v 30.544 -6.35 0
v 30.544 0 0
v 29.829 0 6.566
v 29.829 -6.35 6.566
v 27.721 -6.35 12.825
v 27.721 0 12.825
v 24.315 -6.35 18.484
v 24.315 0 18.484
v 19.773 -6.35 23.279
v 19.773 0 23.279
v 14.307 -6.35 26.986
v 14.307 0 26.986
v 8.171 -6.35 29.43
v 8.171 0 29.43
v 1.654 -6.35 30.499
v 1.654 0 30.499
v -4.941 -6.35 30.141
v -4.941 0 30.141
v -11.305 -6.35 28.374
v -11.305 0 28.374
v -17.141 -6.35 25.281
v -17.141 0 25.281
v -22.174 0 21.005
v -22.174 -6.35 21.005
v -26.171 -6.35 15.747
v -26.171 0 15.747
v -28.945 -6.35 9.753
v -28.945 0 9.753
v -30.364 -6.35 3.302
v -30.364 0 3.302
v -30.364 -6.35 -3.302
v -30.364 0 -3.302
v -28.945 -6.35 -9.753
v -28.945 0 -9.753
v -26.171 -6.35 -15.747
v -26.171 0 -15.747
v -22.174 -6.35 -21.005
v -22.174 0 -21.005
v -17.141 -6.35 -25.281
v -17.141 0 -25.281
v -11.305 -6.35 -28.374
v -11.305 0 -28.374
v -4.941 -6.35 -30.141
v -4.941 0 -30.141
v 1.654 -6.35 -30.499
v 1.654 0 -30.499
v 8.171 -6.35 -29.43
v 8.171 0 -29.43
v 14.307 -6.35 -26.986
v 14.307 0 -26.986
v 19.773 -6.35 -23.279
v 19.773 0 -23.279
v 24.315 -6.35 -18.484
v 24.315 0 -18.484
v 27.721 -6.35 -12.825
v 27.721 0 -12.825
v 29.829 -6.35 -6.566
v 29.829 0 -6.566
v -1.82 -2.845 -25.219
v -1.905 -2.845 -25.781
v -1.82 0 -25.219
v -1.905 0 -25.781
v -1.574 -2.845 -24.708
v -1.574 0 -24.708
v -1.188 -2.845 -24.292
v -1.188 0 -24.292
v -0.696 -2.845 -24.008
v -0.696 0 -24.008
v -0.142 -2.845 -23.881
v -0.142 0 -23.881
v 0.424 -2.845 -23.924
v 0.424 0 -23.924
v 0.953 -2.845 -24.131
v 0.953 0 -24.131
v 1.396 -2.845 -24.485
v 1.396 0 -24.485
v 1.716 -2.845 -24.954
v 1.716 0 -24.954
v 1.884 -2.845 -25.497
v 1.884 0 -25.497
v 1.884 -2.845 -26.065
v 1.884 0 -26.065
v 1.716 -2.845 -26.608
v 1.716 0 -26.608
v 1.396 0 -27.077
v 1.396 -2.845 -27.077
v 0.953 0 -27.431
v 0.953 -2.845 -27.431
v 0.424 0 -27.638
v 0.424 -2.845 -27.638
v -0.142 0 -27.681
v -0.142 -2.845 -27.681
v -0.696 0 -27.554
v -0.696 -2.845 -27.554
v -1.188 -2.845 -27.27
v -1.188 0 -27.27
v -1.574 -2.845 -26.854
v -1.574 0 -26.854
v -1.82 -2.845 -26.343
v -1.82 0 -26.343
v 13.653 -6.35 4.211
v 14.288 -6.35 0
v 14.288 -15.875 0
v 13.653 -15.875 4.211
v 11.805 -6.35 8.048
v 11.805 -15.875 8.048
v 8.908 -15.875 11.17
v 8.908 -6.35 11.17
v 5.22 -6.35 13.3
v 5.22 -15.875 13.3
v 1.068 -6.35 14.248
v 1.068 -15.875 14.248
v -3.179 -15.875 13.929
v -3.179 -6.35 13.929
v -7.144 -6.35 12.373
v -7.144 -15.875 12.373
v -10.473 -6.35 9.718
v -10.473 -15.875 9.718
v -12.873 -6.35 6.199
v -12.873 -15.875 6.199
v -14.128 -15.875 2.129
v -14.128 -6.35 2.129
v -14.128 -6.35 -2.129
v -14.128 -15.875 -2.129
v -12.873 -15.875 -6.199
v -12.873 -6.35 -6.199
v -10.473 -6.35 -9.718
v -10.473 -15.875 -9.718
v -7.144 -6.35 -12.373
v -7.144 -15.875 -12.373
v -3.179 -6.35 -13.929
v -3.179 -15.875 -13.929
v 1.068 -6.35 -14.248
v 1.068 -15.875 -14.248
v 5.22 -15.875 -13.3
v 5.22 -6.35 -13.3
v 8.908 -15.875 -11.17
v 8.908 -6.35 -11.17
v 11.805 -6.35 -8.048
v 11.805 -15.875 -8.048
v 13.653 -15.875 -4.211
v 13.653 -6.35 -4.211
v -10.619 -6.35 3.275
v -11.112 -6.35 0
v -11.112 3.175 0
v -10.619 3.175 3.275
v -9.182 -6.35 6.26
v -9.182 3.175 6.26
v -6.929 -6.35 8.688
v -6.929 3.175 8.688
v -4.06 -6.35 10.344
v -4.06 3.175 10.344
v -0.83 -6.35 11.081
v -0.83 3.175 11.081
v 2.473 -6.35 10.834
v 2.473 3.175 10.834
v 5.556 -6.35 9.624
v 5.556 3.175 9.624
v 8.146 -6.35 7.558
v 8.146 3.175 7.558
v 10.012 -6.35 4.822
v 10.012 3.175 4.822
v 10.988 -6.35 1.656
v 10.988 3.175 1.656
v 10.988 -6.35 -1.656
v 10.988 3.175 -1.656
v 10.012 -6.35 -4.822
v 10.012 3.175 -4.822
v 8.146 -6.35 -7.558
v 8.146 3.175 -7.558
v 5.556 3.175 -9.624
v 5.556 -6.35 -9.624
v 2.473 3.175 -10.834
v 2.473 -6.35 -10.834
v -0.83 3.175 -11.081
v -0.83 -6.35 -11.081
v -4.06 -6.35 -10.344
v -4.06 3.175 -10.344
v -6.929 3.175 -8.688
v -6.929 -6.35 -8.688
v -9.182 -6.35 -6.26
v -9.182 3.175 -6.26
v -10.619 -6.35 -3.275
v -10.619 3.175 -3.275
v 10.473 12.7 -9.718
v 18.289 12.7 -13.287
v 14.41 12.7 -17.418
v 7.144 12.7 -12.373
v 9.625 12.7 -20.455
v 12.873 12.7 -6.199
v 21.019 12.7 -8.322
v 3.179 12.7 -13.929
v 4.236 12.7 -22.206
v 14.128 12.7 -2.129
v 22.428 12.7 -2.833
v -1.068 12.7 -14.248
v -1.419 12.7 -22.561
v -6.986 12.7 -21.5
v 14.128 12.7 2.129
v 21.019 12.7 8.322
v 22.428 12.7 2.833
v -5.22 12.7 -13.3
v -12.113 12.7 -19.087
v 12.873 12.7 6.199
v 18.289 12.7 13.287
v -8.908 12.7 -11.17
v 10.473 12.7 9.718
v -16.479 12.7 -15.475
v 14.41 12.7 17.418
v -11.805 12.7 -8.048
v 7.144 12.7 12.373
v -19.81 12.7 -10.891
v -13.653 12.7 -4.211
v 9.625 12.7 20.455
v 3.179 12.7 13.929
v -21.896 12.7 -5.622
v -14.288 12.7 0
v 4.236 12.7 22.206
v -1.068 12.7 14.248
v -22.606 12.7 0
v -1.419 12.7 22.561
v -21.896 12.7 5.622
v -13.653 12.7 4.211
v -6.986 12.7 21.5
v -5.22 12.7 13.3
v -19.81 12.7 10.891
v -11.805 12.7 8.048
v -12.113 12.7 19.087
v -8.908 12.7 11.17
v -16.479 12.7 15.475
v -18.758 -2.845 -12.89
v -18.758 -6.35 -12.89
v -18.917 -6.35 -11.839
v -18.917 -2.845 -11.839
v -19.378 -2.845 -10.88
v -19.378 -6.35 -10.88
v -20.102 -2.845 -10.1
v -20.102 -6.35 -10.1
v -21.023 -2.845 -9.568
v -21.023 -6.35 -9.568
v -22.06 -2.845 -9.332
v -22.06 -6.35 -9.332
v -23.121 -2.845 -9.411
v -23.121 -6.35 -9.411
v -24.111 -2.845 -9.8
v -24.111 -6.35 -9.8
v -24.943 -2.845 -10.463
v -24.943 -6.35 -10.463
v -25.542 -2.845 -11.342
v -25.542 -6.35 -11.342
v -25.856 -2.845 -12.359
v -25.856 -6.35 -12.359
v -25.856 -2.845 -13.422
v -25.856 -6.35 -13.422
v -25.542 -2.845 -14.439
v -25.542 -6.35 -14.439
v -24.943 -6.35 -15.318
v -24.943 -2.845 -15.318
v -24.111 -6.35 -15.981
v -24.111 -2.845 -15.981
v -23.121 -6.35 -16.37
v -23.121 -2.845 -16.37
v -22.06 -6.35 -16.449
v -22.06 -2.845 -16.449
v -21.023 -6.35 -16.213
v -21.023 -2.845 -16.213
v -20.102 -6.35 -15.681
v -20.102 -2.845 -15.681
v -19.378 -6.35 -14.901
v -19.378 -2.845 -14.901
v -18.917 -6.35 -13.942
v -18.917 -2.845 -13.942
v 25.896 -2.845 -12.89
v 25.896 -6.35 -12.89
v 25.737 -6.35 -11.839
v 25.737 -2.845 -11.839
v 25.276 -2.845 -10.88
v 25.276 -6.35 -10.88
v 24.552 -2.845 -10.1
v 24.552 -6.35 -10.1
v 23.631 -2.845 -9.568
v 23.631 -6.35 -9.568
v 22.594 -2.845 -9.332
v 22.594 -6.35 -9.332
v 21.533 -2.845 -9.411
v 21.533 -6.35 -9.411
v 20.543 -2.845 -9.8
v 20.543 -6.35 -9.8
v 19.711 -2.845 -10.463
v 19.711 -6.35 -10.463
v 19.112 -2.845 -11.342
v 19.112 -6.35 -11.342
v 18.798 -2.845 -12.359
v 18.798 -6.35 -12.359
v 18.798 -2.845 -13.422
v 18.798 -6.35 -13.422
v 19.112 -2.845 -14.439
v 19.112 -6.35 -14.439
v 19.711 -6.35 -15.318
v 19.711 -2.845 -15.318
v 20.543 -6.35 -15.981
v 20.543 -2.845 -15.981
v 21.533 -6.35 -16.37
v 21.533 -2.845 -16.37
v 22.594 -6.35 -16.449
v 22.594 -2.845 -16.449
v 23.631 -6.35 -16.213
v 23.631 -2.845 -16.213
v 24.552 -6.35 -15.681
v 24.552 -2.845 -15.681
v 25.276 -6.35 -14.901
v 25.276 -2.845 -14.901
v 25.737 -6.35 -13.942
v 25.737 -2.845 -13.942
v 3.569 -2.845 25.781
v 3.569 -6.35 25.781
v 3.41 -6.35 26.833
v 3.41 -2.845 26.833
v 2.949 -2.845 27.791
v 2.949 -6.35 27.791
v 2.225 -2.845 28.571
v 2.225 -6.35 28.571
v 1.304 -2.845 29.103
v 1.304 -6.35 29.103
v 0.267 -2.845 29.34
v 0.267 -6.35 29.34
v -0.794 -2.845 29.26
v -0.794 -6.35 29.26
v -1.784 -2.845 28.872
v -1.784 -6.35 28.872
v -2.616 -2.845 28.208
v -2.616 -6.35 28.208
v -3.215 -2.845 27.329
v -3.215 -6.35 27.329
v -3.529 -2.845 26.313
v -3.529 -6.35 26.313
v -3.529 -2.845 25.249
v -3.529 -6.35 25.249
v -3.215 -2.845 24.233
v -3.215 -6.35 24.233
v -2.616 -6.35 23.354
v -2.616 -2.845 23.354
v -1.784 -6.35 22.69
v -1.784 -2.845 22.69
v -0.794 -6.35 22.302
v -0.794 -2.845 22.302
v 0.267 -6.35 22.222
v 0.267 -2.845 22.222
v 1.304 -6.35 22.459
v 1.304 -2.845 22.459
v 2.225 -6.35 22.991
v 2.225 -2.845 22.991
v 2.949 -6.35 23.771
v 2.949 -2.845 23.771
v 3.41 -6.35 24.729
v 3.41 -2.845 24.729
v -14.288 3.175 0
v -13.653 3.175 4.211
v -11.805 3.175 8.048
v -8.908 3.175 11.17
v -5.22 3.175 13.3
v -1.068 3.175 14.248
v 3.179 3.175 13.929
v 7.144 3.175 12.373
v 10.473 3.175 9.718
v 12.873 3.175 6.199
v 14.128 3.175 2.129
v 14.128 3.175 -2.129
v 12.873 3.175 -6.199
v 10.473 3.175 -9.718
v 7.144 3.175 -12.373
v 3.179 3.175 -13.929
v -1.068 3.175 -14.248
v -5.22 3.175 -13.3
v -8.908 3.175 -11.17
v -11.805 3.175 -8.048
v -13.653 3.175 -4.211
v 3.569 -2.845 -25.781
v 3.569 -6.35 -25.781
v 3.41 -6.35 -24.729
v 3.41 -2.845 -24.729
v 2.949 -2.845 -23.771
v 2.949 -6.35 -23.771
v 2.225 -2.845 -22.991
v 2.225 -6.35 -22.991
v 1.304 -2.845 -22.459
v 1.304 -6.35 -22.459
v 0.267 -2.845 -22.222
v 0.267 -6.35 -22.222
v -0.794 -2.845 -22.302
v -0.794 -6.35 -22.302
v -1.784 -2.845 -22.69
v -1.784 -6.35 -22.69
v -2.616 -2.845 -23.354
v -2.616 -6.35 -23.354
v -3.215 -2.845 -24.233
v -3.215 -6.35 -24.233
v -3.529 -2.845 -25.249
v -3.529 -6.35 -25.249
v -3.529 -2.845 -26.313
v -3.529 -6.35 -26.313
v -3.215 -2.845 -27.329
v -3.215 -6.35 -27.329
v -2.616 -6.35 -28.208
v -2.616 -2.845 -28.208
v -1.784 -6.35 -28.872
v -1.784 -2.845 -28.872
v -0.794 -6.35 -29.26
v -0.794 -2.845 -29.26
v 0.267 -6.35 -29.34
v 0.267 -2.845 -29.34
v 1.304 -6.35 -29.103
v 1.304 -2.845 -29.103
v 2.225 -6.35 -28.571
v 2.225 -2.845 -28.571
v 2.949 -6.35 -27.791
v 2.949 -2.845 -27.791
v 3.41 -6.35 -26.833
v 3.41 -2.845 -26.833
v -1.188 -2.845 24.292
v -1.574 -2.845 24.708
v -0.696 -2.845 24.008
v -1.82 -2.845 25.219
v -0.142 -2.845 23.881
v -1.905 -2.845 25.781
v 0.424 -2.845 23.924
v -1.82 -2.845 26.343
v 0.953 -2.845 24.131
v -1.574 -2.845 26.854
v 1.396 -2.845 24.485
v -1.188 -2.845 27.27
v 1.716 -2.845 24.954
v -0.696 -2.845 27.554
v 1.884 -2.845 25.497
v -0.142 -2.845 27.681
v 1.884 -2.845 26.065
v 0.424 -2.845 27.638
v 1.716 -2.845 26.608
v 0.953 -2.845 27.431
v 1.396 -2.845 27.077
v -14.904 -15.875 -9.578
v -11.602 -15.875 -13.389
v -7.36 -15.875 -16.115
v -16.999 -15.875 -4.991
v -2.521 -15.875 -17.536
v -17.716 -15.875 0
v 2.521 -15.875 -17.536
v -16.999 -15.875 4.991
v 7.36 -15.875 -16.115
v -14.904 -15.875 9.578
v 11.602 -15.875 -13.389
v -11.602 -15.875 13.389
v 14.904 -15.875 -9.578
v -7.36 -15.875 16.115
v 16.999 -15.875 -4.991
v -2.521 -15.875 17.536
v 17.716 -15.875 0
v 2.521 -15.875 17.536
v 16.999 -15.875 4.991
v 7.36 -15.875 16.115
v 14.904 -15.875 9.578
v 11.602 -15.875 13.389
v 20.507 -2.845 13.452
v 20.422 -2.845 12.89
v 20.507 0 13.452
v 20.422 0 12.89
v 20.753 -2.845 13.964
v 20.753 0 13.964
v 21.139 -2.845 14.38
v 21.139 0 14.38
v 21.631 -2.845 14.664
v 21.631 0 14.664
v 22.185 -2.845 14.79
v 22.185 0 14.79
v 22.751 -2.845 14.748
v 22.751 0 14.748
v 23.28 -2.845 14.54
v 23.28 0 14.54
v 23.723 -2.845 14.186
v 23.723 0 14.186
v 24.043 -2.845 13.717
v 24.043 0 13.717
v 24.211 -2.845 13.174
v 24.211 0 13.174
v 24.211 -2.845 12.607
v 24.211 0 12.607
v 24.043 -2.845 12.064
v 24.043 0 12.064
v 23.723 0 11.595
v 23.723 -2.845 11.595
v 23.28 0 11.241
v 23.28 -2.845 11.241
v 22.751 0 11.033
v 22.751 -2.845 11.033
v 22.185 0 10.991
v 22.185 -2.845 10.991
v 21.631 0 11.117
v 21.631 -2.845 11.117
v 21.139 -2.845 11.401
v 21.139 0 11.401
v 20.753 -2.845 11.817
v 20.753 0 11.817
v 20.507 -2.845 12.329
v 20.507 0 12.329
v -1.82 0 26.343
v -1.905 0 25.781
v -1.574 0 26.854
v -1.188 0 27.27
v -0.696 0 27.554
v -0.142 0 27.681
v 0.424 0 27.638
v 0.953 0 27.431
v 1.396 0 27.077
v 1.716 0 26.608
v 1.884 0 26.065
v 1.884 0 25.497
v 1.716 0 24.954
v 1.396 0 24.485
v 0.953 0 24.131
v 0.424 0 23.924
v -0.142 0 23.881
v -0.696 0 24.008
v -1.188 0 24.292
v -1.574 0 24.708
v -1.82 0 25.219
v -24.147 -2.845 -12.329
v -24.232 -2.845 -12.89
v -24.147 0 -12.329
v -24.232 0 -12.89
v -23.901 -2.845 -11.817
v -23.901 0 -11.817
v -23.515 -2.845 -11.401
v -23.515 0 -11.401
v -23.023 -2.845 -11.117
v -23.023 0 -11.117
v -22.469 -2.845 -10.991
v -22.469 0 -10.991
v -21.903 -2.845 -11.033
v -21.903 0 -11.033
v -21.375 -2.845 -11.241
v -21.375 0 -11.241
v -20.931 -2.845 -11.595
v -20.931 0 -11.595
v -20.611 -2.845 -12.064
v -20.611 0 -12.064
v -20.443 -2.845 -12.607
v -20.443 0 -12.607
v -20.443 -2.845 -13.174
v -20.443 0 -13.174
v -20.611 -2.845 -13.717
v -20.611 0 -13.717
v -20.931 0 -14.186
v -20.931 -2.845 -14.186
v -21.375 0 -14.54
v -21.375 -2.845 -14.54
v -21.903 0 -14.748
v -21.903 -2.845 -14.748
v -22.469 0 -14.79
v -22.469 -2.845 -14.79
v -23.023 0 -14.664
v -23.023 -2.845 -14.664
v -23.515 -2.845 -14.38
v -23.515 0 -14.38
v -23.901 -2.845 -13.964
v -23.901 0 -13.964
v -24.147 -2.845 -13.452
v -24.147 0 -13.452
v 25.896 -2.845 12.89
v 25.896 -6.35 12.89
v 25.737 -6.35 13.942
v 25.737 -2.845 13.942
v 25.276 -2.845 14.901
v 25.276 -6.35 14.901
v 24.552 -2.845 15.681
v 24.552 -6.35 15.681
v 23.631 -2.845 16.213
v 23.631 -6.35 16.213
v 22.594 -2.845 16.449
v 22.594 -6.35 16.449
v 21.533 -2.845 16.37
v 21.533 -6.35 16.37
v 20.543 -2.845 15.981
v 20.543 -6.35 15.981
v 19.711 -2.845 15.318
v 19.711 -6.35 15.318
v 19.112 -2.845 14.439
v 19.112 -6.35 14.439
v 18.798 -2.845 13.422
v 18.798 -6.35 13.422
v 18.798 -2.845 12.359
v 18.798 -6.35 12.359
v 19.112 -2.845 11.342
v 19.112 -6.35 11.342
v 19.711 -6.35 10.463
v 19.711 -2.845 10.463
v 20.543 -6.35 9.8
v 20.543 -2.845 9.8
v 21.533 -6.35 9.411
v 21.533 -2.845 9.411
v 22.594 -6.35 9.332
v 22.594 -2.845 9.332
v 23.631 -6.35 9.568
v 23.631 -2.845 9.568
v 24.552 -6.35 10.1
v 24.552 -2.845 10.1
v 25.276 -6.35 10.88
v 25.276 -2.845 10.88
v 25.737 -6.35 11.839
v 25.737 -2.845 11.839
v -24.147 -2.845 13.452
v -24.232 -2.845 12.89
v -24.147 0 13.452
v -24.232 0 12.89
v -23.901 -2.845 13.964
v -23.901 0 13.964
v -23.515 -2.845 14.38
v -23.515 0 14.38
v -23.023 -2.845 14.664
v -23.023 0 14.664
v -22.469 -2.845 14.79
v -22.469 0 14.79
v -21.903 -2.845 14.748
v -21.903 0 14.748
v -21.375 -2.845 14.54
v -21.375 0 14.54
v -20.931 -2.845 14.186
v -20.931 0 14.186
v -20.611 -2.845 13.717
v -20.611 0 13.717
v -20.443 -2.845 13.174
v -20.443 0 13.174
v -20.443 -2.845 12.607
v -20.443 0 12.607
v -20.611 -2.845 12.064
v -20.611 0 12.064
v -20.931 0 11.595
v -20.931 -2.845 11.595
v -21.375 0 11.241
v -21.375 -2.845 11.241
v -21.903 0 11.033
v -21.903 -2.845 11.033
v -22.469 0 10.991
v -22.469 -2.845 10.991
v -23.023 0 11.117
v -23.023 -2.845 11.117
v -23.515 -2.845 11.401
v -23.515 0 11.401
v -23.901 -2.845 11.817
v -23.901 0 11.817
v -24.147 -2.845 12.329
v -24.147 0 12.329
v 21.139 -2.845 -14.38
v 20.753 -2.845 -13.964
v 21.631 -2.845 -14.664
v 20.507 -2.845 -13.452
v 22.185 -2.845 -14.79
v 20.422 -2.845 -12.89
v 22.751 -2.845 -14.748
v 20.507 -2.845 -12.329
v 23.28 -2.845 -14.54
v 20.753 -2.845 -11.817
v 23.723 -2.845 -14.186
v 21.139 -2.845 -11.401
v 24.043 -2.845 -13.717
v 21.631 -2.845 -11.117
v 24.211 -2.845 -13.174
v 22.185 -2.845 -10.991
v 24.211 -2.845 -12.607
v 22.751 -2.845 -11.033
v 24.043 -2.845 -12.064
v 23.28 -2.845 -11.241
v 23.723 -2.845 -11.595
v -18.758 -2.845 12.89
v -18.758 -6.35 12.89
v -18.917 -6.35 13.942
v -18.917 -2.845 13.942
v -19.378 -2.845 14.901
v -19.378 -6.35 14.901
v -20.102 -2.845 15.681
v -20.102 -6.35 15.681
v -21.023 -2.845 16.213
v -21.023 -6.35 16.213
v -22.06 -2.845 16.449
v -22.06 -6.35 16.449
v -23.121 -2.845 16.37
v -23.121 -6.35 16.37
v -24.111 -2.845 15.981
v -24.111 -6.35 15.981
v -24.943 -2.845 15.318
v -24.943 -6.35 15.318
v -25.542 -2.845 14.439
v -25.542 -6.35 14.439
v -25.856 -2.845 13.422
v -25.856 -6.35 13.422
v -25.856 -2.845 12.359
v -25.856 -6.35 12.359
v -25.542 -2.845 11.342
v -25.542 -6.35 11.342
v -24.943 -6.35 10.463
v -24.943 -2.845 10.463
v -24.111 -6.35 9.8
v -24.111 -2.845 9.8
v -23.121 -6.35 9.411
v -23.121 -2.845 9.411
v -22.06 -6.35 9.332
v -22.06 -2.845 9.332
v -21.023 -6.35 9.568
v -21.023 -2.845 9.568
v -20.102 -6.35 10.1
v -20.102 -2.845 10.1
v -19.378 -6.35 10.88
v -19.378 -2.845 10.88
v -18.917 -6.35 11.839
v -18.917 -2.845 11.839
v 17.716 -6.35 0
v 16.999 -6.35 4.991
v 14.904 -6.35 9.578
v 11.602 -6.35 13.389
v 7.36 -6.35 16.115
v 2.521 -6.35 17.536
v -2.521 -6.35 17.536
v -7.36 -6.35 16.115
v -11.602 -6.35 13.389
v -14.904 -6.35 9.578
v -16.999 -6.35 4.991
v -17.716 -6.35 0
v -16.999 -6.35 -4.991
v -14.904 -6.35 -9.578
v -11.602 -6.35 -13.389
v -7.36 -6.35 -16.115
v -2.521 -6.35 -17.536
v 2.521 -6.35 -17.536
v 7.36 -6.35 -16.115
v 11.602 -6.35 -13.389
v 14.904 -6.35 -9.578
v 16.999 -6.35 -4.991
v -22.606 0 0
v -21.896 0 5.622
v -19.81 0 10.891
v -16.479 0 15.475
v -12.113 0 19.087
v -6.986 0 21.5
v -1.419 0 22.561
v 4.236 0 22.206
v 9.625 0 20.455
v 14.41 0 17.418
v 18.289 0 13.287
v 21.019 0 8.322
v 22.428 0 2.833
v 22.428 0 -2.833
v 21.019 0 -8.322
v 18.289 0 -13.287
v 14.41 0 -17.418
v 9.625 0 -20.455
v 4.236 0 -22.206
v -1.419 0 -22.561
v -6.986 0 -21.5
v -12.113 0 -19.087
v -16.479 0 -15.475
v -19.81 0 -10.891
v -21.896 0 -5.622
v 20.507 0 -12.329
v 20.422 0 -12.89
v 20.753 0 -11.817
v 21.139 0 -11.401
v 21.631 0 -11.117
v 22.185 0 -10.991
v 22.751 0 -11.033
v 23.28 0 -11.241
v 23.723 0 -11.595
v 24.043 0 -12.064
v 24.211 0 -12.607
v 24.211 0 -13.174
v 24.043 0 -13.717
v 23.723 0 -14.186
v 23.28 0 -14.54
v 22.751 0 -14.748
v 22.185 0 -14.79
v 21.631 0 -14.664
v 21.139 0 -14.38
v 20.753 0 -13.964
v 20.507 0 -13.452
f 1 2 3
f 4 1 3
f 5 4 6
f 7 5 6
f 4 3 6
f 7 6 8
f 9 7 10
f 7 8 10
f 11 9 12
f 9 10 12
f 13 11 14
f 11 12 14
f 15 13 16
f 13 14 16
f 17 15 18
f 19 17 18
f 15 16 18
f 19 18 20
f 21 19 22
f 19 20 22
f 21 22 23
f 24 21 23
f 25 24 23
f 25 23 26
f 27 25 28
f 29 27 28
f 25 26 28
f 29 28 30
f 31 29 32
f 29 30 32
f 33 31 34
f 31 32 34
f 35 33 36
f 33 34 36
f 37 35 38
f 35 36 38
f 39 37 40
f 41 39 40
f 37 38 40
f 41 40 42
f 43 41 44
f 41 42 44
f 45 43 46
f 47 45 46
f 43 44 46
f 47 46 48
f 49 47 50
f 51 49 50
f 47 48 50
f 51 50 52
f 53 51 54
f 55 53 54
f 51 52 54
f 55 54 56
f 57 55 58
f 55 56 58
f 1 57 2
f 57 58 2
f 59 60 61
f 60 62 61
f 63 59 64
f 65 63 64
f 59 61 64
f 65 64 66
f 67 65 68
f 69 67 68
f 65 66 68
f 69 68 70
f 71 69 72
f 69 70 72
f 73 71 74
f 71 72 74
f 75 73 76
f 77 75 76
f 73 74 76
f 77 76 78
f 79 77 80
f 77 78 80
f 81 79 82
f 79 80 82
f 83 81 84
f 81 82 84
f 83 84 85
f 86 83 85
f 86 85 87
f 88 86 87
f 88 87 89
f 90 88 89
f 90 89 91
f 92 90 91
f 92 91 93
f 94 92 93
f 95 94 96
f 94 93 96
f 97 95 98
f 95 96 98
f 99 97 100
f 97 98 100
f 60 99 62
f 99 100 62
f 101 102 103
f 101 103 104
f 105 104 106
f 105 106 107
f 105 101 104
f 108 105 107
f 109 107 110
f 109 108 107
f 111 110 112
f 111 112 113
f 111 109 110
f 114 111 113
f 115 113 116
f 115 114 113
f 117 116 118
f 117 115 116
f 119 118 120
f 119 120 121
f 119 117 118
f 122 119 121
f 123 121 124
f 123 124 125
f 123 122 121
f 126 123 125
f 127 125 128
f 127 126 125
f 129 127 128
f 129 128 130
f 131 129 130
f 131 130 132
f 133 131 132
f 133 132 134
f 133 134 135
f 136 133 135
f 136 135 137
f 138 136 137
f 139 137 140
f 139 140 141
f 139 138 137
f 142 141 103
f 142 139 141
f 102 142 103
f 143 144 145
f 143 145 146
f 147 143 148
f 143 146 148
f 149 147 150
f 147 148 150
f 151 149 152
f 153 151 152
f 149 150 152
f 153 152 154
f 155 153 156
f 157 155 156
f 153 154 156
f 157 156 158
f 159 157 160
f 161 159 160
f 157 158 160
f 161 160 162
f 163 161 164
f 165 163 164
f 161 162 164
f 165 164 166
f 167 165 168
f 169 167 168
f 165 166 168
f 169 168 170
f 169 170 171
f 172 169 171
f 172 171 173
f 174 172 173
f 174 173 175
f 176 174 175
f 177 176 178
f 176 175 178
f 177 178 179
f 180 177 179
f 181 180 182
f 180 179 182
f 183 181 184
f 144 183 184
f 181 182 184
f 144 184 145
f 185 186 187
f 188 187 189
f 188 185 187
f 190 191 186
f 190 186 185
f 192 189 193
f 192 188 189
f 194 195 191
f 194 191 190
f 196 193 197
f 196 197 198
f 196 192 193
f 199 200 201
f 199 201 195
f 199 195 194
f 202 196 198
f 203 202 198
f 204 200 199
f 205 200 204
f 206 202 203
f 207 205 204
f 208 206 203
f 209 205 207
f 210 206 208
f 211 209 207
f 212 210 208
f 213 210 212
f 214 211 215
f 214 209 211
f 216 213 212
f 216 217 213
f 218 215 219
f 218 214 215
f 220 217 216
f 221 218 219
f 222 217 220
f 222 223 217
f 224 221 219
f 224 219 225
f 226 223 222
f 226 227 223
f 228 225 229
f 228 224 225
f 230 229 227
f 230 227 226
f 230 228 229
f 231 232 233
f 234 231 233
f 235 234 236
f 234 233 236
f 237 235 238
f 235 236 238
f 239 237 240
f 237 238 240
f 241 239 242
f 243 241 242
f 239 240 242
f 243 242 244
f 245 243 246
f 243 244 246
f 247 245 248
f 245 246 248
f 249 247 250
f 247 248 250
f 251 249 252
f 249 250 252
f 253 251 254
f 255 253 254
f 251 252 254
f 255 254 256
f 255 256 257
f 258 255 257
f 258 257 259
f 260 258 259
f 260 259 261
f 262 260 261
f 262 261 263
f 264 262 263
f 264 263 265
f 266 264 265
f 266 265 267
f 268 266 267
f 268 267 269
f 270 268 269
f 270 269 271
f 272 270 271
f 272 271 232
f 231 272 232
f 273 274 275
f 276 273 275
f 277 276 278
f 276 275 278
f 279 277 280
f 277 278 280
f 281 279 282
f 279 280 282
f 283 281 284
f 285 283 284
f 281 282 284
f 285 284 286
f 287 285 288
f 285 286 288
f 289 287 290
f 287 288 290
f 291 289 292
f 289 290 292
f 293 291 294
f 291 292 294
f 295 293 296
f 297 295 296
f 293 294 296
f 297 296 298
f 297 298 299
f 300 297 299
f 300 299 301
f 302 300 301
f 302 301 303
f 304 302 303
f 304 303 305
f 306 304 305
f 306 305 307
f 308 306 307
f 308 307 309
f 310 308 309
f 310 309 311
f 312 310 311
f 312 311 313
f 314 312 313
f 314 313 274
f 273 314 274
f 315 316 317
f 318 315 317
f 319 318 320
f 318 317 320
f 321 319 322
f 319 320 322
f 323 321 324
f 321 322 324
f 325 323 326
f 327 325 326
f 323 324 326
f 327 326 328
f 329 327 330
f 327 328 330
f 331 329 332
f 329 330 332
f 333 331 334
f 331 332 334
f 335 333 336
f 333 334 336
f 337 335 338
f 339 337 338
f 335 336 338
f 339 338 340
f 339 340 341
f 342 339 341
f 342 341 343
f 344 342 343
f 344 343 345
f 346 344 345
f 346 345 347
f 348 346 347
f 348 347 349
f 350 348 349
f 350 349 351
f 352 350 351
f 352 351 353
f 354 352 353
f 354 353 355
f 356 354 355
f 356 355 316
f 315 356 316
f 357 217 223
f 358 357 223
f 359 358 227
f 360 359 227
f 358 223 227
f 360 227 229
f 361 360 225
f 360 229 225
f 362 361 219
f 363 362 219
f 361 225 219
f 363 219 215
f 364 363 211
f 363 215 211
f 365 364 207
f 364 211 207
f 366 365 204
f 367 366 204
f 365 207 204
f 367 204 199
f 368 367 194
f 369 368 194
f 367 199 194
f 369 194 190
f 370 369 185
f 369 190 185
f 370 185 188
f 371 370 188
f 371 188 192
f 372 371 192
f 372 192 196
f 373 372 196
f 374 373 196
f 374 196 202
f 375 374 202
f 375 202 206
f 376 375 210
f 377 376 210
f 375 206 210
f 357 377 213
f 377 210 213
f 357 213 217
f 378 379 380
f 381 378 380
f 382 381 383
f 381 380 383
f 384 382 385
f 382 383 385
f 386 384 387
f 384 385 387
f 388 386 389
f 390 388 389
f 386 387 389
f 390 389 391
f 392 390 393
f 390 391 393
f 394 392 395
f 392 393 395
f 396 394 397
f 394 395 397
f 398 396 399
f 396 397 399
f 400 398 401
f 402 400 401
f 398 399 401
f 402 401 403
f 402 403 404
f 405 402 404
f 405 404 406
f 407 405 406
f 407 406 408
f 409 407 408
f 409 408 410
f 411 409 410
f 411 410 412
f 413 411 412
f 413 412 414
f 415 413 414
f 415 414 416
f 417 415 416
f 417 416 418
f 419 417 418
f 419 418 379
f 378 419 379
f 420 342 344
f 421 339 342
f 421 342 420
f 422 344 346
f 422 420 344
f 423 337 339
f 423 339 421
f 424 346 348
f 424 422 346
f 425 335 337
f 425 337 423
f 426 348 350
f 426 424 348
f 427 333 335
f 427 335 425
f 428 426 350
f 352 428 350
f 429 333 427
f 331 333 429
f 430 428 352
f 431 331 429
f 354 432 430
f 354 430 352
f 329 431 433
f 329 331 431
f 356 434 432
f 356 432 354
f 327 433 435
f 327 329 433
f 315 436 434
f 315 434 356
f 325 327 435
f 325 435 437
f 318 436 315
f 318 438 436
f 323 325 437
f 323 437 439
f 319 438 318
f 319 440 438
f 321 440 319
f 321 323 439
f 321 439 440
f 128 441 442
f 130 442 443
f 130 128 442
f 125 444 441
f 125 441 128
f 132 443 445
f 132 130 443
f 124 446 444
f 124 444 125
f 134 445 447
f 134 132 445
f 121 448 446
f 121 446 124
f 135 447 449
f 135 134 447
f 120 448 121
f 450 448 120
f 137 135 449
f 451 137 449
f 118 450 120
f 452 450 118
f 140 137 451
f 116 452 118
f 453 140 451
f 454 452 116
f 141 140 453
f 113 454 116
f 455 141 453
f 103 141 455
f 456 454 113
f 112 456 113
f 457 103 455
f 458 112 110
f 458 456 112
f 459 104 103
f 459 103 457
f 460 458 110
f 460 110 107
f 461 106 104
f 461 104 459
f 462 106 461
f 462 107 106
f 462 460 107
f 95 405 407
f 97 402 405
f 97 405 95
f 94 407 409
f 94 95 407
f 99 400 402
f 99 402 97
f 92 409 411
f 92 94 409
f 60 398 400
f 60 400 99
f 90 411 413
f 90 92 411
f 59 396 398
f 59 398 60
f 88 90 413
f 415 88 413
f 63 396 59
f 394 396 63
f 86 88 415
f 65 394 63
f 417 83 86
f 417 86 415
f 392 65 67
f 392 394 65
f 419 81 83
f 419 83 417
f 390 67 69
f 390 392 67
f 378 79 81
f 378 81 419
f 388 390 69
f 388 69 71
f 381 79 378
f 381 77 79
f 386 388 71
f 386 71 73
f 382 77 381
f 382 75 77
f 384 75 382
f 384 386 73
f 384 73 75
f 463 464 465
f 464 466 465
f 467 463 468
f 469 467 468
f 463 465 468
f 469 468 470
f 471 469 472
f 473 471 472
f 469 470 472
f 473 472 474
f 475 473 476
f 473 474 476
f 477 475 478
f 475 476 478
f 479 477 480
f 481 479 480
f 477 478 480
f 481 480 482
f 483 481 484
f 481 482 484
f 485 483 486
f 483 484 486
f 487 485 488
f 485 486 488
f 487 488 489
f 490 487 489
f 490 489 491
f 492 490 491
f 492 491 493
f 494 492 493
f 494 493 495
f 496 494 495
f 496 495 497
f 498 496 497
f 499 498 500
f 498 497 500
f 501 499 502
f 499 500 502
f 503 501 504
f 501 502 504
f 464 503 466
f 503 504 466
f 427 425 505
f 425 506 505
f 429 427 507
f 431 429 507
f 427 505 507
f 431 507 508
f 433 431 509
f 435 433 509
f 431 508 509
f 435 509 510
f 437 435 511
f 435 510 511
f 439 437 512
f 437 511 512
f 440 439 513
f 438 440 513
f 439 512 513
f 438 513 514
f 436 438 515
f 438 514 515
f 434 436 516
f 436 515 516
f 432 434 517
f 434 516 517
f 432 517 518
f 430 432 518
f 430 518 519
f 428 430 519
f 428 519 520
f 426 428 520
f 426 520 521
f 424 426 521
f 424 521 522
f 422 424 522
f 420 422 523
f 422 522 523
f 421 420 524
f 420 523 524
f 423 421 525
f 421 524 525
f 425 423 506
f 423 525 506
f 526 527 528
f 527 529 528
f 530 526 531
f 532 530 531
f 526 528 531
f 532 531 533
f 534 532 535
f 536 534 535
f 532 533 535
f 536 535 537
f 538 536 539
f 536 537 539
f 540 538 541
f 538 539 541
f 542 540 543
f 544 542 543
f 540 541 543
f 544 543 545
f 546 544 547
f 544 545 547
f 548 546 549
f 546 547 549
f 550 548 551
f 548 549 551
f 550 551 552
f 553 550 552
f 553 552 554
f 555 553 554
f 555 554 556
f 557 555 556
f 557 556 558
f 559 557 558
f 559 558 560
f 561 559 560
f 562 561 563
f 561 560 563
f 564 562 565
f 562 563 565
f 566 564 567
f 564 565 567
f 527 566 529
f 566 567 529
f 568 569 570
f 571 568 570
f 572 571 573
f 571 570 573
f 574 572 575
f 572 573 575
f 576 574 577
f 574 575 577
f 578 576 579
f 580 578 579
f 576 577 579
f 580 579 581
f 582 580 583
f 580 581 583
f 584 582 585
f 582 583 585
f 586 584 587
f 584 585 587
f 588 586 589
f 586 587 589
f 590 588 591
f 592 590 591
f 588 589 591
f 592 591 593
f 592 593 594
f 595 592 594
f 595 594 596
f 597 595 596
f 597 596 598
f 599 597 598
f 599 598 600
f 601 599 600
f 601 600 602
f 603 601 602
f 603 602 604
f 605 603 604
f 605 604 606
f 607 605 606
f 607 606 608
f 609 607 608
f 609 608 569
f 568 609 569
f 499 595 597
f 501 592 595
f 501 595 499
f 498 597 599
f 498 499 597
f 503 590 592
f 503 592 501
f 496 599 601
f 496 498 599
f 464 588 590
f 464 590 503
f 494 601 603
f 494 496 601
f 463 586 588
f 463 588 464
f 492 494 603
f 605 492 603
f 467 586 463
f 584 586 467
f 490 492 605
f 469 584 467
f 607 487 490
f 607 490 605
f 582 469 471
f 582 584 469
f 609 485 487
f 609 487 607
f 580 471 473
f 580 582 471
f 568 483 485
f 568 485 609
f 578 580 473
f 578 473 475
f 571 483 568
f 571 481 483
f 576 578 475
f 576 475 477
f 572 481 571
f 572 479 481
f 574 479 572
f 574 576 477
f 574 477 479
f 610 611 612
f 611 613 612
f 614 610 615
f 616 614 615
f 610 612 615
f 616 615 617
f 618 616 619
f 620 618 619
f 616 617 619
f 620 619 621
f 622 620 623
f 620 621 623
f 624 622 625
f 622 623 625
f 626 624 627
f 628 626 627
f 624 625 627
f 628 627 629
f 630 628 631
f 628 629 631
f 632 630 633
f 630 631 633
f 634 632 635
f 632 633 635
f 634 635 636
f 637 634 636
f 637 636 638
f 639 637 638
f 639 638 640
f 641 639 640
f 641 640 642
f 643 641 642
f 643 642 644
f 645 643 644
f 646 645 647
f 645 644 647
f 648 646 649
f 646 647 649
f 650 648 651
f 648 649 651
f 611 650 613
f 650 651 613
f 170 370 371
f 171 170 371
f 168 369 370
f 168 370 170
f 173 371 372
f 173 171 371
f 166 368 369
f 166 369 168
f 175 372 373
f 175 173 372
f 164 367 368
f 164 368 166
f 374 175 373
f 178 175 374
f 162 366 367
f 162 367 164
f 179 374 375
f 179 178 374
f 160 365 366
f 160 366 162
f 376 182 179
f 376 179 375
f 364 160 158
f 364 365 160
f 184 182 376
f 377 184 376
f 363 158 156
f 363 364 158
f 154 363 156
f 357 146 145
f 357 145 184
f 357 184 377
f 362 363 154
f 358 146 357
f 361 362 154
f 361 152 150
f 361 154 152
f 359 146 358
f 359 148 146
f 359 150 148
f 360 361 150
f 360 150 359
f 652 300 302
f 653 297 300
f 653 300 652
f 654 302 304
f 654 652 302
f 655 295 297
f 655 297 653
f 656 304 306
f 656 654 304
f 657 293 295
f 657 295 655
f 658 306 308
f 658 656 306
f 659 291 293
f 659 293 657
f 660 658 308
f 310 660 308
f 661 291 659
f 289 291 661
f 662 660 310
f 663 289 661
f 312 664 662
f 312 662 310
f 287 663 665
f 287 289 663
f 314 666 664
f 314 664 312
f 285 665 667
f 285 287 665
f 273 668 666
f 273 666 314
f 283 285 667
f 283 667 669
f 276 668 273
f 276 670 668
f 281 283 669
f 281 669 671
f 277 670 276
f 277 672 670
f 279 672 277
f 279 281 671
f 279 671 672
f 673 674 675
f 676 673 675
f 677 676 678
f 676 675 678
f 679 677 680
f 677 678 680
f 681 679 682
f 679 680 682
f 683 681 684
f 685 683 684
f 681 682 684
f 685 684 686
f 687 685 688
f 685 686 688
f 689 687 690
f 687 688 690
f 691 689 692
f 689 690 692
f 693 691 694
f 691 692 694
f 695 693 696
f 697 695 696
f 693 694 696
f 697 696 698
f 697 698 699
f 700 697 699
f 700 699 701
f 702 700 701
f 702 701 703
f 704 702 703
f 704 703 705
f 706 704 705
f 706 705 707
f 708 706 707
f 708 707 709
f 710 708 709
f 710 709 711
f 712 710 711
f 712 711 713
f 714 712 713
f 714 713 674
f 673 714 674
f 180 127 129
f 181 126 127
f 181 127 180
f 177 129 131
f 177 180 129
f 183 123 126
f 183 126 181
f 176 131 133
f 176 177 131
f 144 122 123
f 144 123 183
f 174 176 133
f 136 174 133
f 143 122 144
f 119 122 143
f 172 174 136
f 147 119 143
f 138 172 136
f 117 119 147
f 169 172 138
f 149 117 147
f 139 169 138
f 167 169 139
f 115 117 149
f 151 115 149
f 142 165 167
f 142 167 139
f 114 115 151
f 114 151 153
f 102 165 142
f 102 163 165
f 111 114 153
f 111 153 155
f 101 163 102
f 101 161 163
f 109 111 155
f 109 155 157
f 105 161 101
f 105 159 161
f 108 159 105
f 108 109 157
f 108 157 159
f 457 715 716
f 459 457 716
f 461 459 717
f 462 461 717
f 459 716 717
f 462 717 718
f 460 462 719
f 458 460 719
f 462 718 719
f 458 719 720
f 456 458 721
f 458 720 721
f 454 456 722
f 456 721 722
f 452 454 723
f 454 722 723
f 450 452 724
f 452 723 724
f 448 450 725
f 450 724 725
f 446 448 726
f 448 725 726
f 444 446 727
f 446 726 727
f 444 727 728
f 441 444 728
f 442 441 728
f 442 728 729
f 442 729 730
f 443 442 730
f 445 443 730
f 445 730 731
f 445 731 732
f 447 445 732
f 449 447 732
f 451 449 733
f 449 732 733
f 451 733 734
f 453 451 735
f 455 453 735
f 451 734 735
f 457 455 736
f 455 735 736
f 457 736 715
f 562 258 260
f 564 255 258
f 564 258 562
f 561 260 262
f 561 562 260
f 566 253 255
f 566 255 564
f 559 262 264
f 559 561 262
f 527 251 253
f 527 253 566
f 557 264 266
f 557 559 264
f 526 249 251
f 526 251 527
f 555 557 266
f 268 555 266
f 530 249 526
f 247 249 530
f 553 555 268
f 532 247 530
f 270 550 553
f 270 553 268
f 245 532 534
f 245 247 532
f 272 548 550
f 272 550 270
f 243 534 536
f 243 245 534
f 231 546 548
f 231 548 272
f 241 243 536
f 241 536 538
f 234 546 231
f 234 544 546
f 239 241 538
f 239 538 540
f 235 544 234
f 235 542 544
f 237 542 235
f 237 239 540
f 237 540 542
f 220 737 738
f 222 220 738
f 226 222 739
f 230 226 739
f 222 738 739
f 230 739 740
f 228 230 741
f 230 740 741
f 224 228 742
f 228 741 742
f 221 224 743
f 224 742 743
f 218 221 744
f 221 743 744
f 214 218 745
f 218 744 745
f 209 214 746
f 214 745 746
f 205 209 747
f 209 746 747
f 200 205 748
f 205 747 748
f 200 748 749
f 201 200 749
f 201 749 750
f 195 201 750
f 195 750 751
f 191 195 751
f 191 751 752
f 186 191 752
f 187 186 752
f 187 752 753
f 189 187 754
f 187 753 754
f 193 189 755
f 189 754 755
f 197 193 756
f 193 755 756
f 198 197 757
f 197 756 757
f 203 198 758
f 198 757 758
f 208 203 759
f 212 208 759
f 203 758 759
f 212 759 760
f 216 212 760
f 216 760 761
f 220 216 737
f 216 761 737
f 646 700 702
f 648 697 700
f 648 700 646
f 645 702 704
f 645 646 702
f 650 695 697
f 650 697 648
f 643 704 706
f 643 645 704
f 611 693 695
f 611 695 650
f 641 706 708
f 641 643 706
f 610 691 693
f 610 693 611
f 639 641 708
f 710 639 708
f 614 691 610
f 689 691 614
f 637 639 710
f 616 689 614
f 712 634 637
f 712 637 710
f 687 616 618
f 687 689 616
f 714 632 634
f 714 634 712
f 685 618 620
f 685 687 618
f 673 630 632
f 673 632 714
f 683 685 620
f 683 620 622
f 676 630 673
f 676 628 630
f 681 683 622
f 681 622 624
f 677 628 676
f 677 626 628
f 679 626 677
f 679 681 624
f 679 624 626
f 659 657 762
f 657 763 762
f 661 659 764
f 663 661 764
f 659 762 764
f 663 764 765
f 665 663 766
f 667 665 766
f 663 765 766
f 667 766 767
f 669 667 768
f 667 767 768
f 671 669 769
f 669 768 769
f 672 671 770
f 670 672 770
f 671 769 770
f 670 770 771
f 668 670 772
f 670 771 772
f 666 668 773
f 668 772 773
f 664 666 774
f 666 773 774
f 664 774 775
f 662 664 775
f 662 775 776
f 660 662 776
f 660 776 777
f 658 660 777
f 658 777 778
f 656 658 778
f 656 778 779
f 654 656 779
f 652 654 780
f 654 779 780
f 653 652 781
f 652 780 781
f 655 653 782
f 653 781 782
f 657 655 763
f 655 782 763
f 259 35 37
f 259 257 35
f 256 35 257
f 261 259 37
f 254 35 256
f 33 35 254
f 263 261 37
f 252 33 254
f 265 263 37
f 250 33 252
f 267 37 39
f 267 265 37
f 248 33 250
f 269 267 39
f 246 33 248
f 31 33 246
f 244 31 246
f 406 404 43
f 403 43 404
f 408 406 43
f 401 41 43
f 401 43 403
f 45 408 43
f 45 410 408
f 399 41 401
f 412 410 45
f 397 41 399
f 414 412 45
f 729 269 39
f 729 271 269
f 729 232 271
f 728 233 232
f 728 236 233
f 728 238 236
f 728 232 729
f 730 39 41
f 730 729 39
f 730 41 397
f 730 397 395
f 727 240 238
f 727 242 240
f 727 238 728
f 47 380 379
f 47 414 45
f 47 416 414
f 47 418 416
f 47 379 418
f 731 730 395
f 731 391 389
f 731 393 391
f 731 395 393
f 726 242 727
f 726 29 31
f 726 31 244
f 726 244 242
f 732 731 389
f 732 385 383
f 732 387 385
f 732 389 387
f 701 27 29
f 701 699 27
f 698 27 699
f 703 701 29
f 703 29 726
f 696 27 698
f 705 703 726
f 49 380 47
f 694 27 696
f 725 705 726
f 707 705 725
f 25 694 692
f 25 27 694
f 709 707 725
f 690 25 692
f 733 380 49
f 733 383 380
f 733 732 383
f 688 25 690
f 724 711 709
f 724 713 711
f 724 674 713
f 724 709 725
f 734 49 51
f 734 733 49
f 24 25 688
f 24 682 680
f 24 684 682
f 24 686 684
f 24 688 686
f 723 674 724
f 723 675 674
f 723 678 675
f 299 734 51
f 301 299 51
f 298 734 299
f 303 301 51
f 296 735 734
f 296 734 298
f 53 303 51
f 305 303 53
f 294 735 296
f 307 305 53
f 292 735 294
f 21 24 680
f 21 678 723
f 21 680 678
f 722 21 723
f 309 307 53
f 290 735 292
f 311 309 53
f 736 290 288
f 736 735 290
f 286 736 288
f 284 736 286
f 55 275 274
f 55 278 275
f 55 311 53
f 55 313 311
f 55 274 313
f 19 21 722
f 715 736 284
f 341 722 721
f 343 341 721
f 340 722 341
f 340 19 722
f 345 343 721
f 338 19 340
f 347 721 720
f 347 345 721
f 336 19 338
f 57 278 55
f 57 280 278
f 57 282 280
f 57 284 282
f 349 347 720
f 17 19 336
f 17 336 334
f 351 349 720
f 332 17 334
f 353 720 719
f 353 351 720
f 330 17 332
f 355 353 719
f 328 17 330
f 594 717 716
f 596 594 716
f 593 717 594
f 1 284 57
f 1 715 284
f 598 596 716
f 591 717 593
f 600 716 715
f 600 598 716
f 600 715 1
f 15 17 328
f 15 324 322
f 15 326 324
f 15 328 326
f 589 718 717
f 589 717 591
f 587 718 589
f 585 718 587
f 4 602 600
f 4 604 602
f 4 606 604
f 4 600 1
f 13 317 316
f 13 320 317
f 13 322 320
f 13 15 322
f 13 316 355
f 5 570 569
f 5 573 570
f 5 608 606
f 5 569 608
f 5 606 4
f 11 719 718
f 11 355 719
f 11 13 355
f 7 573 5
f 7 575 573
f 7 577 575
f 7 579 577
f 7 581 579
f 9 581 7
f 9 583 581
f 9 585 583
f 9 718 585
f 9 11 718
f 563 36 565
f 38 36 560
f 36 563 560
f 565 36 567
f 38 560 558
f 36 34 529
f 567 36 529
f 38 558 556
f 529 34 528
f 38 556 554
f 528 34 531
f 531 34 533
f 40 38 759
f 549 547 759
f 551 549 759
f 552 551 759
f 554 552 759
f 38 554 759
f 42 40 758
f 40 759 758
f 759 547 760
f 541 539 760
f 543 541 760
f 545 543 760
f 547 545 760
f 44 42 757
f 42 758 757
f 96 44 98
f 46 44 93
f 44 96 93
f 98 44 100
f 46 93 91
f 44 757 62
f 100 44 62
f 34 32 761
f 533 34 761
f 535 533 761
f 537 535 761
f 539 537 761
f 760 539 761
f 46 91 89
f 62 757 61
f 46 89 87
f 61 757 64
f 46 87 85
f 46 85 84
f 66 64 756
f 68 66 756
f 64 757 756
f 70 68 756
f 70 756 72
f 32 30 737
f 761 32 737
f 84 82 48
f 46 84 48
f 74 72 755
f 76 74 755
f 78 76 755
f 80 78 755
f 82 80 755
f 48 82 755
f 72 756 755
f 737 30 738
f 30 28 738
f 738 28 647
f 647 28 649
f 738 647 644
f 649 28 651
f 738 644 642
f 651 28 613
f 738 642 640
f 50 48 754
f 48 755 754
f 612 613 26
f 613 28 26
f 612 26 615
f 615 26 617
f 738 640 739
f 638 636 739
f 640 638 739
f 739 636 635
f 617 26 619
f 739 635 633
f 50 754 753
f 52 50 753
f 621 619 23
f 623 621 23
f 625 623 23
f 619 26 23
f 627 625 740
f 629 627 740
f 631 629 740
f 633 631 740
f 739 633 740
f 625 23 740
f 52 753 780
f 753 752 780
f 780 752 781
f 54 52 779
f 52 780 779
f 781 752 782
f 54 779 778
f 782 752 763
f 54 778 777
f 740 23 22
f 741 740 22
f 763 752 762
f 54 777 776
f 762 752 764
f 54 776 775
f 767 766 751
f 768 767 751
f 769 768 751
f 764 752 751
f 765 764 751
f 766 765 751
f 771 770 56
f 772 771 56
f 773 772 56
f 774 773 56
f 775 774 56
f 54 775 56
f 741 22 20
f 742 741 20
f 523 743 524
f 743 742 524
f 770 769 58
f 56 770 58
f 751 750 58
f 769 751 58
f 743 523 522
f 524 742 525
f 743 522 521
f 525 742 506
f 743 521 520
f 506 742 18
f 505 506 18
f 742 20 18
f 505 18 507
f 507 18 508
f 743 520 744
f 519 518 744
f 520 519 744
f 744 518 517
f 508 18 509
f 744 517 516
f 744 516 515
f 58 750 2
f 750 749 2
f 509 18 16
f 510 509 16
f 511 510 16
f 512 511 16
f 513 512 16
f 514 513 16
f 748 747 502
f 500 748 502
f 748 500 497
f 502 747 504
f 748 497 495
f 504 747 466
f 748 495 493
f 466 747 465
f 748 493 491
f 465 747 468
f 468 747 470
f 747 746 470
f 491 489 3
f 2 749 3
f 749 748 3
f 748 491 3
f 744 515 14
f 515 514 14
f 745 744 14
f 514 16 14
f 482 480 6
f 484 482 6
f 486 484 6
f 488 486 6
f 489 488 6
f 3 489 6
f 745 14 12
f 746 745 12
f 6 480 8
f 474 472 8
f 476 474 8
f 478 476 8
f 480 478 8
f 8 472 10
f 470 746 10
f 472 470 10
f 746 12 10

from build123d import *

# Parameters (mm, degrees)
F0_R            = 30.5435
F1_DEPTH        = 6.35
F2_R            = 17.7165
F2_R_2          = 14.2875
F3_DEPTH        = 9.525
F4_R            = 22.606
F5_DEPTH        = 12.7
F6_R            = 14.2875
F7_DEPTH        = 9.525
F8_R            = 11.1125
F9_DEPTH        = 19.05
F11_D           = 3.81
F11_CBORE_D     = 7.1374
F11_CBORE_DEPTH = 3.5052


with BuildPart() as f1:
    # F0 (on Front) → F1 (new body)
    with BuildSketch(Plane.XZ):
        Circle(F0_R)
    extrude(amount=F1_DEPTH)

    # F2 (on face) → F3 (join)
    with BuildSketch(Plane.XZ.offset(6.35)):
        Circle(F2_R)
        Circle(F2_R_2, mode=Mode.SUBTRACT)
    extrude(amount=F3_DEPTH)

    # F4 (on face) → F5 (join)
    with BuildSketch(Plane(origin=(0, 0, 0), x_dir=(-1, 0, 0), z_dir=(0, 1, 0))):
        Circle(F4_R)
    extrude(amount=F5_DEPTH)

    # F6 (on face) → F7 (cut)
    with BuildSketch(Plane(origin=(0, 12.7, 0), x_dir=(-1, 0, 0), z_dir=(0, 1, 0))):
        Circle(F6_R)
    extrude(amount=-F7_DEPTH, mode=Mode.SUBTRACT)

    # F8 (on face) → F9 (cut, symmetric)
    with BuildSketch(Plane(origin=(0, 3.175, 0), x_dir=(-1, 0, 0), z_dir=(0, 1, 0))):
        Circle(F8_R)
    extrude(amount=F9_DEPTH, both=True, mode=Mode.SUBTRACT)

    # F11 (through all)
    with Locations(Plane.XZ.offset(6.35)):
        with Locations((0, 25.781), (-22.327000935, 12.8905), (-22.327000935, -12.8905), (0, -25.781), (22.327000935, -12.8905), (22.327000935, 12.8905)):
            CounterBoreHole(F11_D / 2, F11_CBORE_D / 2, F11_CBORE_DEPTH)


solid = f1.part
